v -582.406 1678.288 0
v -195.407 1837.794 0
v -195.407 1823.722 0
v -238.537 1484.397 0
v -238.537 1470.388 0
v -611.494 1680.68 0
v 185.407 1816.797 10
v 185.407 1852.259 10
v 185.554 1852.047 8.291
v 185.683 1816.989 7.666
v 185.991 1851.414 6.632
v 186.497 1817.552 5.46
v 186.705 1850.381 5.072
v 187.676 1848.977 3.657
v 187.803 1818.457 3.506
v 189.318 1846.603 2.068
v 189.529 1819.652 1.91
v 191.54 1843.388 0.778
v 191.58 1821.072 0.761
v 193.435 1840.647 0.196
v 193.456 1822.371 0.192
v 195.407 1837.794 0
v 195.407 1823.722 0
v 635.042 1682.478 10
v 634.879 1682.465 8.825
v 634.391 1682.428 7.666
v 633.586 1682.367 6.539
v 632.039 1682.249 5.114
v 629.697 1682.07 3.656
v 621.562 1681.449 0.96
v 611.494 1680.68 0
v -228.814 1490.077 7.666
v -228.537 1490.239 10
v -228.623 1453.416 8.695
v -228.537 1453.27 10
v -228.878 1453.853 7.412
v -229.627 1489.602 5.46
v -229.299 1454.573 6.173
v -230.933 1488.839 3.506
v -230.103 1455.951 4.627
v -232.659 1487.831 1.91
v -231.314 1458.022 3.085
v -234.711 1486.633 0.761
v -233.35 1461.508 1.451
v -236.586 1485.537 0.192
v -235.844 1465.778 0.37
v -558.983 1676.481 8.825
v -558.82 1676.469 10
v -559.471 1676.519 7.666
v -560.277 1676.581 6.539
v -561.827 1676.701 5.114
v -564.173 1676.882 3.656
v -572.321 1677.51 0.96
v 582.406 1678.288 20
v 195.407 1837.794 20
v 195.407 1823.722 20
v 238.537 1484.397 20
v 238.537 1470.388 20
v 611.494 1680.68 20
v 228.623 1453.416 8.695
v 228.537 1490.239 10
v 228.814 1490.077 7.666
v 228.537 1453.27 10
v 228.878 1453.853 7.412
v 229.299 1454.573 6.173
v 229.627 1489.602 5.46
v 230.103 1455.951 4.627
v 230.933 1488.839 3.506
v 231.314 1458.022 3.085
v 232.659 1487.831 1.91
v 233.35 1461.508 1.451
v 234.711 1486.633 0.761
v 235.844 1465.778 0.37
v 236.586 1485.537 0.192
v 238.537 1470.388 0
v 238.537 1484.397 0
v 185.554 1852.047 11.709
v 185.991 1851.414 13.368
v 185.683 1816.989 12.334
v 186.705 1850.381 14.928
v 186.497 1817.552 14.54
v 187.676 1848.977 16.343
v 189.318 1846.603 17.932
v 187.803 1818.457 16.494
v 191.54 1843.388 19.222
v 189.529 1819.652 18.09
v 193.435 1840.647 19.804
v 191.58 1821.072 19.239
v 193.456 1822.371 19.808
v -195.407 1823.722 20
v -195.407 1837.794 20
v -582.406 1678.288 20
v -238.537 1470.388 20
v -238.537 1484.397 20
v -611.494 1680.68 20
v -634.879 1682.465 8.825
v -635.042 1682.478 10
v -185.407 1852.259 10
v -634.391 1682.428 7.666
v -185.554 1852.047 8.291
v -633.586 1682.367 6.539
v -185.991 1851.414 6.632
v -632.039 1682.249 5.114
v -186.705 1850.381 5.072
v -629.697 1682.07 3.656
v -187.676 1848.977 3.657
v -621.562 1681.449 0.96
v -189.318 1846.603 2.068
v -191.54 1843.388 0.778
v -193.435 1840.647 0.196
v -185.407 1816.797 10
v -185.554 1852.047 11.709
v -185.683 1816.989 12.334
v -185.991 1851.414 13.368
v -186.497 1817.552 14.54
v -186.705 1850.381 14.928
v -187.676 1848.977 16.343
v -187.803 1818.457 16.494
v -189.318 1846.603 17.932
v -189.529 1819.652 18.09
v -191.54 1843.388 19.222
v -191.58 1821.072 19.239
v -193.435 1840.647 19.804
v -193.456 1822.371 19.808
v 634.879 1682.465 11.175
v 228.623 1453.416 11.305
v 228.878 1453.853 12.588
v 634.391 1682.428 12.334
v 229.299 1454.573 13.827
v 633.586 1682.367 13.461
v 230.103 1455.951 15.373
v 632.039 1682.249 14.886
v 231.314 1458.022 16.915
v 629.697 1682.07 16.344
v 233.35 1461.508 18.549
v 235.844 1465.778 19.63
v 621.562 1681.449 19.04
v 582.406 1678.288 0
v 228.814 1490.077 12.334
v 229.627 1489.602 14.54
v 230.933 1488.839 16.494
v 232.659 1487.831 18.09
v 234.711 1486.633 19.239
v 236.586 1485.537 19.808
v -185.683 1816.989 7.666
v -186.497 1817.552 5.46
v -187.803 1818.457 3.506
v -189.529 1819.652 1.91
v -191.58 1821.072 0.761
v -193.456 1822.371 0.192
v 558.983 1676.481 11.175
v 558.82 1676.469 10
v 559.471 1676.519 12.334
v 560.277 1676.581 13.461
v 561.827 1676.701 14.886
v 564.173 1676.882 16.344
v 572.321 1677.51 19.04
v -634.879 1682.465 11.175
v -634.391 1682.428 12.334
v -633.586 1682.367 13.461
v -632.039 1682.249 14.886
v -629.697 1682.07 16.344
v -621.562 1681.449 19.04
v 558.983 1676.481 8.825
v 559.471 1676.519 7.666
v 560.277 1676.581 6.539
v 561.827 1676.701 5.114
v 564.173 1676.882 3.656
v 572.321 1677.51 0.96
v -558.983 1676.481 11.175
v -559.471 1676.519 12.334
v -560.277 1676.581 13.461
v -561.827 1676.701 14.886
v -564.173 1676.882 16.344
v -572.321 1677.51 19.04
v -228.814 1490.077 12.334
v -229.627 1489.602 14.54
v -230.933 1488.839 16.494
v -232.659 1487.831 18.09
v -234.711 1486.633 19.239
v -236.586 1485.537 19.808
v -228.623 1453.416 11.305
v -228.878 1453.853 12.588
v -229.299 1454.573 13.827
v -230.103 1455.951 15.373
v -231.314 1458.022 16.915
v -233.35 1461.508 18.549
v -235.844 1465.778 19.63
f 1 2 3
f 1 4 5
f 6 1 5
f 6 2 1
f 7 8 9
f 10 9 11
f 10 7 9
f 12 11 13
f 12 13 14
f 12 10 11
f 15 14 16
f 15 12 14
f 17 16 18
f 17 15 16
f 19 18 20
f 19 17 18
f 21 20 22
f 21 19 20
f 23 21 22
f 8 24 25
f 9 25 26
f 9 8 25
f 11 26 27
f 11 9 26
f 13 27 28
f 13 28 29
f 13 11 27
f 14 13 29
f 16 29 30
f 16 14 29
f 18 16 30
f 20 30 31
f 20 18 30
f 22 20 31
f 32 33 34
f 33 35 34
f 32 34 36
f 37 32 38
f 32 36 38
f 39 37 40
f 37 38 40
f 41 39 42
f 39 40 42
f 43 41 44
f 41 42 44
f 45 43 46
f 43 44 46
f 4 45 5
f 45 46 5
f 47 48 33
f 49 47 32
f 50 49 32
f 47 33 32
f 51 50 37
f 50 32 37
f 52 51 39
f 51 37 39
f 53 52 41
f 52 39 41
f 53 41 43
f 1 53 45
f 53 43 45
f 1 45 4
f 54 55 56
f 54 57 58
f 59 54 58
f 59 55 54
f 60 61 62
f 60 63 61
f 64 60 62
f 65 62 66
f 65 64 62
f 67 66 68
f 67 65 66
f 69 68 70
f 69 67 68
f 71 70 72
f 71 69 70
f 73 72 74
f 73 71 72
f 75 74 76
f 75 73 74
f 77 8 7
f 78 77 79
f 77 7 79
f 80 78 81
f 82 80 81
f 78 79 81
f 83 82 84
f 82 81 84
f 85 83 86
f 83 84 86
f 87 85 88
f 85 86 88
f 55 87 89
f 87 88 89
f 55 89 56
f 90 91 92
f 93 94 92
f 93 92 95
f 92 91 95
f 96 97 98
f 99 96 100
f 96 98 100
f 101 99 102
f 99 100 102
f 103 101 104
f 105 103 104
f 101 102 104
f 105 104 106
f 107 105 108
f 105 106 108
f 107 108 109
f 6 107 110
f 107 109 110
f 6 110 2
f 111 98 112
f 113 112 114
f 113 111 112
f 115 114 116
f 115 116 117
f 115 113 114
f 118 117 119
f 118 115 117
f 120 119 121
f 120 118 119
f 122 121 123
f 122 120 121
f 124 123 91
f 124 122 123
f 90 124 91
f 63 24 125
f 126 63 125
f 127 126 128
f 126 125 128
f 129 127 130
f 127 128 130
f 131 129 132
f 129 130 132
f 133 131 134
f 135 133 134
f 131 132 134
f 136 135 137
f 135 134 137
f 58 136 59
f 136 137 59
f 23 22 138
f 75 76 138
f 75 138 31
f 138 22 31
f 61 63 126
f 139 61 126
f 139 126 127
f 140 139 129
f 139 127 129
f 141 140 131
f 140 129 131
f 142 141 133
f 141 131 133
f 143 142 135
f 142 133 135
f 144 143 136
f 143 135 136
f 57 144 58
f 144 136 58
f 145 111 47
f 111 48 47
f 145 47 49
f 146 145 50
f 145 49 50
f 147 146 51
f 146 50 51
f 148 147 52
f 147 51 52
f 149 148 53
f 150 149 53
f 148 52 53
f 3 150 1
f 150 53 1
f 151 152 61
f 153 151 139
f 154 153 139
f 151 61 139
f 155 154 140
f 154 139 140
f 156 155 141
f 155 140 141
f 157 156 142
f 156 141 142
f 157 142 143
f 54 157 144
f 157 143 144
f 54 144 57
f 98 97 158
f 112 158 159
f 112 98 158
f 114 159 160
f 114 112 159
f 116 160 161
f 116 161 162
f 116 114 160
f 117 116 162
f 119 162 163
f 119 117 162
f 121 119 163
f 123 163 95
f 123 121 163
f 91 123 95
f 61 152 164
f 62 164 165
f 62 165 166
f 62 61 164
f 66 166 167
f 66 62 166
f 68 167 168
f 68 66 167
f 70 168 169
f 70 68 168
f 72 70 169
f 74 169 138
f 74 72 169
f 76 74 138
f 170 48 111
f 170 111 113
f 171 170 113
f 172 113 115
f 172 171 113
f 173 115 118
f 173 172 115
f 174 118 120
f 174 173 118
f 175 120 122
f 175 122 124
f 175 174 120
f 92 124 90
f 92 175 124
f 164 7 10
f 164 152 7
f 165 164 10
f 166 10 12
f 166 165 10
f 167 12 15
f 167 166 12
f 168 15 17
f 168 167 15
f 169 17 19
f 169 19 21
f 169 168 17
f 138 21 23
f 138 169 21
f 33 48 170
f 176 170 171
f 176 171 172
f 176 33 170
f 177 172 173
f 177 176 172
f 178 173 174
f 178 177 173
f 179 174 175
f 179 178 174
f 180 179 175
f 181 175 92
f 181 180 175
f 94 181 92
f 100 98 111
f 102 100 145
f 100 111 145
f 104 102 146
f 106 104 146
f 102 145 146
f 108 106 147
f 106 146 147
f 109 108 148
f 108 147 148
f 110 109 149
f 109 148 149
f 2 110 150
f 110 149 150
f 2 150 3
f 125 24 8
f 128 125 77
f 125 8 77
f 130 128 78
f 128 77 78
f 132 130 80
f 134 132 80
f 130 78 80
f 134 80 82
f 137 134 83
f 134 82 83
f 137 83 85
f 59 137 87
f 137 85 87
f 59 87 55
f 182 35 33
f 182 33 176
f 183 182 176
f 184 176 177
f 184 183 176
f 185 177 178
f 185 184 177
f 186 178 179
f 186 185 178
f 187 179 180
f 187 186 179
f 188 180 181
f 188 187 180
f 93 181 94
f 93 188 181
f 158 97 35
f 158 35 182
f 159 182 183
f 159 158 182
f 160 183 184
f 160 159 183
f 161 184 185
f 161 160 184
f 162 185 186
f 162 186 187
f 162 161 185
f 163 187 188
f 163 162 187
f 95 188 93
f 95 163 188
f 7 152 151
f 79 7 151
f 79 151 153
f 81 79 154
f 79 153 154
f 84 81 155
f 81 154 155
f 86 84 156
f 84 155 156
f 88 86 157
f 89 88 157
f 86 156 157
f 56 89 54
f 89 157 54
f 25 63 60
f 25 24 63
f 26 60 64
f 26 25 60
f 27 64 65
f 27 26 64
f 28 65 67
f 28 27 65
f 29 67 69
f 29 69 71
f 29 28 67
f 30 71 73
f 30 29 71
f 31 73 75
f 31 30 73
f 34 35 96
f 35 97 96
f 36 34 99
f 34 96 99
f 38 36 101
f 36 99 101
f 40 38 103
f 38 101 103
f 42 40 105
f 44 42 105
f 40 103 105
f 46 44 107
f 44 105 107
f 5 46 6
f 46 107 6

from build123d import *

# Parameters (mm, degrees)
F1_DEPTH = 20
F2_R     = 9.99999


# Not quite as in the source:
# - a fillet or chamfer is up to 0.001 mm smaller than in the source, because OpenCascade refuses the exact size


with BuildPart() as f1:
    # F0 (on Top) → F1 (new body)
    with BuildSketch(Plane.XY):
        Polygon((635.0417733192, 1682.4778318405), (185.4069307446, 1852.2594436146), (185.4069307446, 1816.7974487804), (558.8195690923, 1676.4687693616), (228.5373434424, 1490.2386204266), (228.5373434424, 1453.2696739696), align=None)
    extrude(amount=F1_DEPTH)

    # F2 (radius 10 in the source; OpenCascade refuses exactly that, so slightly less here)
    f2_edges = [f1.edges().sort_by_distance(p)[0] for p in [
        (431.789558, 1567.873753, 20),
        (410.224352, 1767.368638, 20),
        (185.406931, 1834.528446, 20),
        (372.11325, 1746.633109, 20),
        (393.678456, 1583.353695, 20),
        (228.537343, 1471.754147, 20),
        (431.789558, 1567.873753, 0),
        (410.224352, 1767.368638, 0),
        (185.406931, 1834.528446, 0),
        (372.11325, 1746.633109, 0),
        (393.678456, 1583.353695, 0),
        (228.537343, 1471.754147, 0),
    ]]
    fillet(f2_edges, radius=F2_R)


with BuildPart() as f3_1:
    # F3: instance of F1
    add(f1.part.mirror(Plane.YZ))


solid = Compound([f1.part, f3_1.part])
